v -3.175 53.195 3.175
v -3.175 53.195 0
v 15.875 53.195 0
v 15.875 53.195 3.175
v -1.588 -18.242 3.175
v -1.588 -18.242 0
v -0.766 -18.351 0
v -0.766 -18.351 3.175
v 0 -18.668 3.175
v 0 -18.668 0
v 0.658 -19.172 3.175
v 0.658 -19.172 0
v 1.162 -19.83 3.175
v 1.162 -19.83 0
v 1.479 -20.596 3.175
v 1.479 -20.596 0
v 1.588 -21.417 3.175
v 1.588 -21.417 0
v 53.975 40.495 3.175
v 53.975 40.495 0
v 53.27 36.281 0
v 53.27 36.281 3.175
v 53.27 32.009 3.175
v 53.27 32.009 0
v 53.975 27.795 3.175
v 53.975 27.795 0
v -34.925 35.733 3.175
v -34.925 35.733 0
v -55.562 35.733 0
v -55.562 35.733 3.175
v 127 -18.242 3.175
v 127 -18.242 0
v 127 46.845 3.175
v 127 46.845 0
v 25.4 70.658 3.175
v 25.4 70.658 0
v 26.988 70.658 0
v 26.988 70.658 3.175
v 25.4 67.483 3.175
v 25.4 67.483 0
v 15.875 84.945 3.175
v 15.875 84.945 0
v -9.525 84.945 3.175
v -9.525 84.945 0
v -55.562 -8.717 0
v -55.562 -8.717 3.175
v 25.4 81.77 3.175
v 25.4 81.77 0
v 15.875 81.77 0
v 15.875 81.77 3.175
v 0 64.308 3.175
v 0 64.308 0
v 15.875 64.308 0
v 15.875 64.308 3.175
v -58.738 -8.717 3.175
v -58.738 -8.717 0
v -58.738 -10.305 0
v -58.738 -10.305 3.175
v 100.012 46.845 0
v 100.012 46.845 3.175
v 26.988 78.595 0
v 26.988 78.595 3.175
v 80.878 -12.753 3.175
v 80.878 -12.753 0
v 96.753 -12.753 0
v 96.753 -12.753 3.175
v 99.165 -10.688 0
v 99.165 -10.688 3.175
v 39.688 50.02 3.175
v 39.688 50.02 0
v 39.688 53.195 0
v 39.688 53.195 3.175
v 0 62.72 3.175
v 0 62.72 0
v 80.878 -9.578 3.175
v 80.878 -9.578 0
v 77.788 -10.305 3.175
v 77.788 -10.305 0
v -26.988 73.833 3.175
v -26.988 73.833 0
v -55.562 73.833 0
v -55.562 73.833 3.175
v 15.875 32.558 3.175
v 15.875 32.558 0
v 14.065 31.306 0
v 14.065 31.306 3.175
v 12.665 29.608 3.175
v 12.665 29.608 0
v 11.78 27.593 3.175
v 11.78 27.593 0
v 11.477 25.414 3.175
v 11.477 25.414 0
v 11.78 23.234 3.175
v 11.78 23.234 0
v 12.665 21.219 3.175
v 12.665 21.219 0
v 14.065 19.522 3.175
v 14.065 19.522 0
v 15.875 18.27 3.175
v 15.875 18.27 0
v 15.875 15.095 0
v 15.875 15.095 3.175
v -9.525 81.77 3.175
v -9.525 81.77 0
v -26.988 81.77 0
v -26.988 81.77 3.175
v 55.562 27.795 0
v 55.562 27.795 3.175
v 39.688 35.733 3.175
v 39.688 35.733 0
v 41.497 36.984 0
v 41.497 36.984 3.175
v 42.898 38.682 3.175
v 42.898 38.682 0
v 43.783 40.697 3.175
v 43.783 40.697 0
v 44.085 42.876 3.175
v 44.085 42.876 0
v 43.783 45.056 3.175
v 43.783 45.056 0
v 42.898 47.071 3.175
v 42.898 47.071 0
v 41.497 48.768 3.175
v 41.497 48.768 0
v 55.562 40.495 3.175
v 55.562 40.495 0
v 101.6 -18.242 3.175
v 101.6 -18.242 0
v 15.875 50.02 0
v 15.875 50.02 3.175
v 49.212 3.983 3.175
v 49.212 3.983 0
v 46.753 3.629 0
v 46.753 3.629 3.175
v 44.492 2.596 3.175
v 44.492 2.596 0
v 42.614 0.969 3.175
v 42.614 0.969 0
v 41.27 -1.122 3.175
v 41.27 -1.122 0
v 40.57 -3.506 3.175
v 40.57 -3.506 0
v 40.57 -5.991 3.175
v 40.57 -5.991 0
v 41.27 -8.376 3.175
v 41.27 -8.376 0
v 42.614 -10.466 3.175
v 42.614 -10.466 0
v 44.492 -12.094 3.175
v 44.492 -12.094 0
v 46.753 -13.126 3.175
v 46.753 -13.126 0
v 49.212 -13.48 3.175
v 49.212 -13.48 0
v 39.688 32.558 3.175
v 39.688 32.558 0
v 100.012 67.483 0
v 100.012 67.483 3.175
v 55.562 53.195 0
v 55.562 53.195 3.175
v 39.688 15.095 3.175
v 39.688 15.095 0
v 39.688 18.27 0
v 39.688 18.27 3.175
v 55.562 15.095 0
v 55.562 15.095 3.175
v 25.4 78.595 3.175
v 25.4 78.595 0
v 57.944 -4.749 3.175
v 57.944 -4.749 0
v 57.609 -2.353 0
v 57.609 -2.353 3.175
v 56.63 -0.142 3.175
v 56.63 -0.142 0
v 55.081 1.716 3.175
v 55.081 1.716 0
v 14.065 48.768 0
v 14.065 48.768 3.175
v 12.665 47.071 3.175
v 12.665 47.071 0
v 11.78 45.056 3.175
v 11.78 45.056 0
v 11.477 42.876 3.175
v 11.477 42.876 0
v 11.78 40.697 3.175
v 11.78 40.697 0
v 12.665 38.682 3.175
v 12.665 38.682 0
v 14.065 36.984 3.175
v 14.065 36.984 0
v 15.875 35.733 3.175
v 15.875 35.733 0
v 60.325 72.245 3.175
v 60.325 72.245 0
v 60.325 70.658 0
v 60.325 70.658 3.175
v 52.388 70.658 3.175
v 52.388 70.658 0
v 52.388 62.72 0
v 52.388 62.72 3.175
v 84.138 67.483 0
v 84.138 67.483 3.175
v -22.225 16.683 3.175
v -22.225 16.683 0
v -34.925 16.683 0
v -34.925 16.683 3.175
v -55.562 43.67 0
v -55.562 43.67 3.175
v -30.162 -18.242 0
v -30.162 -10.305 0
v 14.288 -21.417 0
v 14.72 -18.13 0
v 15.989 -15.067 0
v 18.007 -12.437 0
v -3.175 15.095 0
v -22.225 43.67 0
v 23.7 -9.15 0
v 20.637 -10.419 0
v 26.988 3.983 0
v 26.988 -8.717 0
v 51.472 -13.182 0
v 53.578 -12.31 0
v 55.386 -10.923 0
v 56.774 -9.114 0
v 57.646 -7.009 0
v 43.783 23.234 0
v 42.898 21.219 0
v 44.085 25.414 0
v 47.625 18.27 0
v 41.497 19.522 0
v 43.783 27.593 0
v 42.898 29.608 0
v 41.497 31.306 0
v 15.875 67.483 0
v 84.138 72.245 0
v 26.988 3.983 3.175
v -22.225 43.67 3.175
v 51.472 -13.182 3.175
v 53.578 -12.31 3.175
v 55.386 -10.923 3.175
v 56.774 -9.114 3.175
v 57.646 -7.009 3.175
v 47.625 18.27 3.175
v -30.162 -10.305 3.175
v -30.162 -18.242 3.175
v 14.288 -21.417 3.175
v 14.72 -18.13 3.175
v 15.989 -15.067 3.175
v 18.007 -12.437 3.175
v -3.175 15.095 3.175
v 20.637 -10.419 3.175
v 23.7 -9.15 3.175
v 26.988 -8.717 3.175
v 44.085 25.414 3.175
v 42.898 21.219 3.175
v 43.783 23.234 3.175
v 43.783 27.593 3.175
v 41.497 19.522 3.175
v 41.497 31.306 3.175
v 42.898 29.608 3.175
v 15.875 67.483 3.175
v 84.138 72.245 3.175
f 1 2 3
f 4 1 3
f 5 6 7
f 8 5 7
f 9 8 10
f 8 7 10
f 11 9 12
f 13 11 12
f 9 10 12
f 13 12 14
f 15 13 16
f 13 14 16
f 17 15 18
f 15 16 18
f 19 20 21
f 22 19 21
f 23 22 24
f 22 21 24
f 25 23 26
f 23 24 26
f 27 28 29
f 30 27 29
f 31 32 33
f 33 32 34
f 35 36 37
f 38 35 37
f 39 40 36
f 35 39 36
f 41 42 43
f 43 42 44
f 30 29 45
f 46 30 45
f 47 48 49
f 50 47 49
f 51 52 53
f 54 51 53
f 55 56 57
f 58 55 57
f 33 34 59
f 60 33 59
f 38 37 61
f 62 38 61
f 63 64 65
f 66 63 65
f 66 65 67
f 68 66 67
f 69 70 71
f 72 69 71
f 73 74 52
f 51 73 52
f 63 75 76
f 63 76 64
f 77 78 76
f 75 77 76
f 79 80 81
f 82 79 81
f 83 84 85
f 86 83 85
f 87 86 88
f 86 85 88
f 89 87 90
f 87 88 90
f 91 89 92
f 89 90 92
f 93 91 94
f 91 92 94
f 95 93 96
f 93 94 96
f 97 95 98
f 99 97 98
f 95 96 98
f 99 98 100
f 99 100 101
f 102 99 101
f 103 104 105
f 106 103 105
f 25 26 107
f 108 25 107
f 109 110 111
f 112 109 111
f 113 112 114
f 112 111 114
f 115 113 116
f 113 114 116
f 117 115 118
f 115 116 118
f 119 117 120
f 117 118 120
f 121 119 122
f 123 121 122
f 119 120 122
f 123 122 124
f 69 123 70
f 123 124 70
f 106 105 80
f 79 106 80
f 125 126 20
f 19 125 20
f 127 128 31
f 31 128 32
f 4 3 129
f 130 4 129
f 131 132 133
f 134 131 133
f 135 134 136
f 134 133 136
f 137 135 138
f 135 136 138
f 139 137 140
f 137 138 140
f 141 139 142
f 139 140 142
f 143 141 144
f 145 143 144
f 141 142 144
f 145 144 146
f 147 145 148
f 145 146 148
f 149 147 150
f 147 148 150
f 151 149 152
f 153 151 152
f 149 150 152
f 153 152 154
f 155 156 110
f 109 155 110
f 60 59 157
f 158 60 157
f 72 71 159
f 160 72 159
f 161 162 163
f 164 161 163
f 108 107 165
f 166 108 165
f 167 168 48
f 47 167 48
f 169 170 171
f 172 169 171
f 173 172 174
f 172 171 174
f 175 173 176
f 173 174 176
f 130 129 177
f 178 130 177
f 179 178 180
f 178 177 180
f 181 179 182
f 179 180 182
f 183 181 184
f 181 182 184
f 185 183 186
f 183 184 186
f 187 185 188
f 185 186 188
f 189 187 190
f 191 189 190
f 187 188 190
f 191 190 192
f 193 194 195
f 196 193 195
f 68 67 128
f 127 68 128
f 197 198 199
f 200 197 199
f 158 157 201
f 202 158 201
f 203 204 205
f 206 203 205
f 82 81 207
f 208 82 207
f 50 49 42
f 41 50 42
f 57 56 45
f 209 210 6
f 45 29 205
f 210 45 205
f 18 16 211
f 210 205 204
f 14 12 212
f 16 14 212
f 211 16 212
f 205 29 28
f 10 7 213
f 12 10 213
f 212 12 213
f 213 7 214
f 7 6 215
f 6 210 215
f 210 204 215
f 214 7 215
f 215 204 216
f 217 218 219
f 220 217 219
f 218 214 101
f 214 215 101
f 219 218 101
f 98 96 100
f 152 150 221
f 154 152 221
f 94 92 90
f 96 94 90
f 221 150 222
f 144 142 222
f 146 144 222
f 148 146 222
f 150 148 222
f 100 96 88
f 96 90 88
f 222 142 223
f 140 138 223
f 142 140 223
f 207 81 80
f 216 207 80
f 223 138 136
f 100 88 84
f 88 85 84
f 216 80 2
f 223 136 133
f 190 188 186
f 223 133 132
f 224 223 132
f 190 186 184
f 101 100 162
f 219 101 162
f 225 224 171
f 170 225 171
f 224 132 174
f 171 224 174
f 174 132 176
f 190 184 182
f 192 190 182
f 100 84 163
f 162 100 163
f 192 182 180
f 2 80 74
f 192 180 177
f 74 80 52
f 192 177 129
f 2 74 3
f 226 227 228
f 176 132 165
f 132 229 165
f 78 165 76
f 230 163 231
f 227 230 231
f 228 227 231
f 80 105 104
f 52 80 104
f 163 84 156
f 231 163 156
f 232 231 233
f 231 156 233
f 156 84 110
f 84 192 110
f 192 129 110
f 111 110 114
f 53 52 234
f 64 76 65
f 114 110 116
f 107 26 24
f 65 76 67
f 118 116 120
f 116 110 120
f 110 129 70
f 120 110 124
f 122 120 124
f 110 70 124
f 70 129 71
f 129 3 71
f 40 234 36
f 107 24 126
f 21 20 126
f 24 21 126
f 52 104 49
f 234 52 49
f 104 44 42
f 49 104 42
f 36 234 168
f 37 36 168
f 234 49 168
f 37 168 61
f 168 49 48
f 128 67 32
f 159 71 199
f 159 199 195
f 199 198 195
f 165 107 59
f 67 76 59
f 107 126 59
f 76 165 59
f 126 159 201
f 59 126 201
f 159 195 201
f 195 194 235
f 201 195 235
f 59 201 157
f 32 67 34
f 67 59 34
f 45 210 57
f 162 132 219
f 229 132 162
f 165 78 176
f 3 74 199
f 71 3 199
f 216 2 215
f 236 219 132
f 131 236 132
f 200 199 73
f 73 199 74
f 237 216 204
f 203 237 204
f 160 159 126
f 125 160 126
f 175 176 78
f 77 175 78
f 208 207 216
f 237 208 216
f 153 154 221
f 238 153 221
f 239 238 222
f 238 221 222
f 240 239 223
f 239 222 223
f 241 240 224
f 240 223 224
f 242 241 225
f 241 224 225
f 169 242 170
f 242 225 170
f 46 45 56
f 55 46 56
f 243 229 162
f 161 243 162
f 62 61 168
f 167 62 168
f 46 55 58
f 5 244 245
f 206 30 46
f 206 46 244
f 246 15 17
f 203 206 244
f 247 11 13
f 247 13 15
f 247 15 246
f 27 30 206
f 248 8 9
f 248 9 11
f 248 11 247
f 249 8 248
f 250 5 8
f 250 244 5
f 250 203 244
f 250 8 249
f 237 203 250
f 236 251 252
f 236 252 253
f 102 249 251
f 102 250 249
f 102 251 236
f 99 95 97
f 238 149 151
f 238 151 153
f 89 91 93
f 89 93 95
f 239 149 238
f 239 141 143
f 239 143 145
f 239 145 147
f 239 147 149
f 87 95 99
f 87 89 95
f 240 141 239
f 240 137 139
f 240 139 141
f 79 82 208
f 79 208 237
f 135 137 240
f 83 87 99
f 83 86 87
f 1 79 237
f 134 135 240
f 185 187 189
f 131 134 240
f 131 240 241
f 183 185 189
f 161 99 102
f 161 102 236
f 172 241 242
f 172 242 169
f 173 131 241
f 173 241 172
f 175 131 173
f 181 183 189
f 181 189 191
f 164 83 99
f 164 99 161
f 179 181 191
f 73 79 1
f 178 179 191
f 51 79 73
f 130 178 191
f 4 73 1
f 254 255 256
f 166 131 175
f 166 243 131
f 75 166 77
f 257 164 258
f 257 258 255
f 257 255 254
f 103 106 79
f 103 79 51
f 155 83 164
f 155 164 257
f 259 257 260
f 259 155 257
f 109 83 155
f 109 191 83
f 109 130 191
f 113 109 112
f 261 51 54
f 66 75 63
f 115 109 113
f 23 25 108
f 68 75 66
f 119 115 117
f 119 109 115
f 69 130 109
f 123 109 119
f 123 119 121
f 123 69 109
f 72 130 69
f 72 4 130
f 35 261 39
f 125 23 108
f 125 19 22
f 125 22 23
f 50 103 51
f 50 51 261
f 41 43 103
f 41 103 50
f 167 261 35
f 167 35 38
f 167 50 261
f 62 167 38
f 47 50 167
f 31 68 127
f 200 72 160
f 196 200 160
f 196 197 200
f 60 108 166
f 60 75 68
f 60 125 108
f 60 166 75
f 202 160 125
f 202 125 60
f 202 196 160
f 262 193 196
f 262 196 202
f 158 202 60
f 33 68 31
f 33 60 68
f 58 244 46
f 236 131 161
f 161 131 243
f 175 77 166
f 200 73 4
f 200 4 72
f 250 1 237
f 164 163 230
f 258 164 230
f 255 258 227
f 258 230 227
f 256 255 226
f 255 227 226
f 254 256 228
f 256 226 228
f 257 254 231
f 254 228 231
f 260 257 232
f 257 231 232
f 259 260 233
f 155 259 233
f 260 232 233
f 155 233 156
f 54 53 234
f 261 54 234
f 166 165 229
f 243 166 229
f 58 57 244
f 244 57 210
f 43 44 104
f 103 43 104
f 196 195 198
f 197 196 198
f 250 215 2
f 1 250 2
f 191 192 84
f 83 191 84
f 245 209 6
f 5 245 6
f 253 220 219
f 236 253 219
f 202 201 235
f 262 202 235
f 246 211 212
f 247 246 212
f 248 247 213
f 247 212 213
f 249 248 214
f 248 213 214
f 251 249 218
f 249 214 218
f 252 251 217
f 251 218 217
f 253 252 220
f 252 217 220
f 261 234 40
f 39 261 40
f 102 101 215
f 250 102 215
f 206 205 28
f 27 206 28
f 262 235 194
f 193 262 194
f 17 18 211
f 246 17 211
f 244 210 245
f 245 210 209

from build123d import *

# Parameters (mm, degrees)
F1_DEPTH = 3.175


# Not quite as in the source:
# - ends of sketch curves that miss each other by under 0.0002 mm in the source are joined


with BuildPart() as f1:
    # F0 (on Top) → F1 (new body)
    with BuildSketch(Plane.XY):
        with BuildLine():
            Line((-34.925, 35.7325066477), (-55.5625, 35.7325066477))
            Line((-55.5625, 35.7325066477), (-55.5625, -8.7174933523))
            Line((-55.5625, -8.7174933523), (-58.7375, -8.7174933523))
            Line((-58.7375, -8.7174933523), (-58.7375, -10.3049933523))
            Line((-58.7375, -10.3049933523), (-30.1625, -10.3049933523))
            Line((-30.1625, -10.3049933523), (-30.1625, -18.2424933523))
            Line((-30.1625, -18.2424933523), (-1.5875, -18.2424933523))
            ThreePointArc((-1.5875, -18.2424933523), (0.6575640303, -19.172429322), (1.5875, -21.4174933523))
            Line((1.5875, -21.4174933523), (14.2875, -21.4174933523))
            ThreePointArc((14.2875, -21.4174933523), (18.0072438789, -12.4372372312), (26.9875, -8.7174933523))
            Line((26.9875, -8.7174933523), (26.9875, 3.9825066477))
            Line((26.9875, 3.9825066477), (49.2125, 3.9825066477))
            ThreePointArc((49.2125, 3.9825066477), (52.3581189283, 3.3961819464), (55.0812659129, 1.7159541056))
            Line((55.0812659129, 1.7159541056), (77.7875, -10.3049933523))
            Line((77.7875, -10.3049933523), (80.8780316716, -9.5775052173))
            Line((80.8780316716, -9.5775052173), (80.8780316716, -12.7525052173))
            Line((80.8780316716, -12.7525052173), (96.7530316716, -12.7525052173))
            Line((96.7530316716, -12.7525052173), (99.1648957133, -10.6876718476))
            Line((99.1648957133, -10.6876718476), (101.6, -18.2424933523))
            Line((101.6, -18.2424933523), (104.775, -18.2424933523))
            Line((104.775, -18.2424933523), (119.0625, -18.2424933523))
            Line((119.0625, -18.2424933523), (127, -18.2424933523))
            Line((127, -18.2424933523), (127, 46.8450066477))
            Line((127, 46.8450066477), (100.0125, 46.8450066477))
            Line((100.0125, 46.8450066477), (100.0125, 67.4825066477))
            Line((100.0125, 67.4825066477), (84.1375, 67.4825066477))
            Line((84.1375, 67.4825066477), (84.1375, 72.2450066477))
            Line((84.1375, 72.2450066477), (66.675, 72.2450066477))
            Line((66.675, 72.2450066477), (60.325, 72.2450066477))
            Line((60.325, 72.2450066477), (60.325, 70.6575066477))
            Line((60.325, 70.6575066477), (52.3875, 70.6575066477))
            Line((52.3875, 70.6575066477), (52.3875, 62.7200066477))
            Line((52.3875, 62.7200066477), (0, 62.7200066477))
            Line((0, 62.7200066477), (0, 64.3075066477))
            Line((0, 64.3075066477), (15.875, 64.3075066477))
            Line((15.875, 64.3075066477), (15.875, 67.4825066477))
            Line((15.875, 67.4825066477), (25.4, 67.4825066477))
            Line((25.4, 67.4825066477), (25.4, 70.6575066477))
            Line((25.4, 70.6575066477), (26.9875, 70.6575066477))
            Line((26.9875, 70.6575066477), (26.9875, 78.5950066477))
            Line((26.9875, 78.5950066477), (25.4, 78.5950066477))
            Line((25.4, 78.5950066477), (25.4, 81.7700066477))
            Line((25.4, 81.7700066477), (15.875, 81.7700066477))
            Line((15.875, 81.7700066477), (15.875, 84.9450066477))
            Line((15.875, 84.9450066477), (-9.525, 84.9450066477))
            Line((-9.525, 84.9450066477), (-9.525, 81.7700066477))
            Line((-9.525, 81.7700066477), (-26.9875, 81.7700066477))
            Line((-26.9875, 81.7700066477), (-26.9875, 73.8325066477))
            Line((-26.9875, 73.8325066477), (-55.5625, 73.8325066477))
            Line((-55.5625, 73.8325066477), (-55.5625, 43.6700066477))
            Line((-55.5625, 43.6700066477), (-22.225, 43.6700066477))
            Line((-22.225, 43.6700066477), (-22.225, 16.6825066477))
            Line((-22.225, 16.6825066477), (-34.925, 16.6825066477))
            Line((-34.925, 16.6825066477), (-34.925, 35.7325066477))
        make_face()
        Polygon((-3.175, 53.1950066477), (15.875, 53.1950066477), (15.875, 50.0200066477), (15.875, 35.7325066477), (15.875, 32.5575066477), (15.875, 18.2700066477), (15.875, 15.0950066477), (-3.175, 15.0950066477), align=None, mode=Mode.SUBTRACT)
        Polygon((39.6875, 50.0200066477), (39.6875, 53.1950066477), (55.5625, 53.1950066477), (55.5625, 40.4950066477), (55.5625, 27.7950066477), (55.5625, 15.0950066477), (47.625, 18.2700066477), (39.6875, 15.0950066477), (39.6875, 18.2700066477), (39.6875, 32.5575066477), (39.6875, 35.7325066477), align=None, mode=Mode.SUBTRACT)
        with BuildLine():
            Line((15.875, 35.7325066477), (15.875, 50.0200066477))
            ThreePointArc((15.875, 50.0200066477), (11.4771704008, 42.8762566477), (15.875, 35.7325066477))
        make_face()
        with BuildLine():
            Line((15.875, 18.2700066477), (15.875, 32.5575066477))
            ThreePointArc((15.875, 32.5575066477), (11.4771704008, 25.4137566477), (15.875, 18.2700066477))
        make_face()
        with BuildLine():
            ThreePointArc((39.6875, 35.7325066477), (44.0853295992, 42.8762566477), (39.6875, 50.0200066477))
            Line((39.6875, 50.0200066477), (39.6875, 35.7325066477))
        make_face()
        with BuildLine():
            ThreePointArc((39.6875, 18.2700066477), (44.0853295992, 25.4137566477), (39.6875, 32.5575066477))
            Line((39.6875, 32.5575066477), (39.6875, 18.2700066477))
        make_face()
        with BuildLine():
            Line((55.5625, 27.7950066477), (55.5625, 40.4950066477))
            Line((55.5625, 40.4950066477), (53.975, 40.4950066477))
            ThreePointArc((53.975, 40.4950066477), (53.1818915421, 34.1450066477), (53.975, 27.7950066477))
            Line((53.975, 27.7950066477), (55.5625, 27.7950066477))
        make_face()
        with BuildLine():
            ThreePointArc((55.0812659129, 1.7159541056), (52.3581189283, 3.3961819464), (49.2125, 3.9825066477))
            Line((49.2125, 3.9825066477), (49.2125, -13.4799933523))
            ThreePointArc((49.2125, -13.4799933523), (55.3864260832, -10.9226694355), (57.94375, -4.7487433523))
            ThreePointArc((57.94375, -4.7487433523), (57.1961203861, -1.2136999165), (55.0812659129, 1.7159541056))
        make_face()
        with BuildLine():
            Line((49.2125, -13.4799933523), (49.2125, 3.9825066477))
            ThreePointArc((49.2125, 3.9825066477), (40.48125, -4.7487433523), (49.2125, -13.4799933523))
        make_face()
    extrude(amount=F1_DEPTH)


solid = f1.part
